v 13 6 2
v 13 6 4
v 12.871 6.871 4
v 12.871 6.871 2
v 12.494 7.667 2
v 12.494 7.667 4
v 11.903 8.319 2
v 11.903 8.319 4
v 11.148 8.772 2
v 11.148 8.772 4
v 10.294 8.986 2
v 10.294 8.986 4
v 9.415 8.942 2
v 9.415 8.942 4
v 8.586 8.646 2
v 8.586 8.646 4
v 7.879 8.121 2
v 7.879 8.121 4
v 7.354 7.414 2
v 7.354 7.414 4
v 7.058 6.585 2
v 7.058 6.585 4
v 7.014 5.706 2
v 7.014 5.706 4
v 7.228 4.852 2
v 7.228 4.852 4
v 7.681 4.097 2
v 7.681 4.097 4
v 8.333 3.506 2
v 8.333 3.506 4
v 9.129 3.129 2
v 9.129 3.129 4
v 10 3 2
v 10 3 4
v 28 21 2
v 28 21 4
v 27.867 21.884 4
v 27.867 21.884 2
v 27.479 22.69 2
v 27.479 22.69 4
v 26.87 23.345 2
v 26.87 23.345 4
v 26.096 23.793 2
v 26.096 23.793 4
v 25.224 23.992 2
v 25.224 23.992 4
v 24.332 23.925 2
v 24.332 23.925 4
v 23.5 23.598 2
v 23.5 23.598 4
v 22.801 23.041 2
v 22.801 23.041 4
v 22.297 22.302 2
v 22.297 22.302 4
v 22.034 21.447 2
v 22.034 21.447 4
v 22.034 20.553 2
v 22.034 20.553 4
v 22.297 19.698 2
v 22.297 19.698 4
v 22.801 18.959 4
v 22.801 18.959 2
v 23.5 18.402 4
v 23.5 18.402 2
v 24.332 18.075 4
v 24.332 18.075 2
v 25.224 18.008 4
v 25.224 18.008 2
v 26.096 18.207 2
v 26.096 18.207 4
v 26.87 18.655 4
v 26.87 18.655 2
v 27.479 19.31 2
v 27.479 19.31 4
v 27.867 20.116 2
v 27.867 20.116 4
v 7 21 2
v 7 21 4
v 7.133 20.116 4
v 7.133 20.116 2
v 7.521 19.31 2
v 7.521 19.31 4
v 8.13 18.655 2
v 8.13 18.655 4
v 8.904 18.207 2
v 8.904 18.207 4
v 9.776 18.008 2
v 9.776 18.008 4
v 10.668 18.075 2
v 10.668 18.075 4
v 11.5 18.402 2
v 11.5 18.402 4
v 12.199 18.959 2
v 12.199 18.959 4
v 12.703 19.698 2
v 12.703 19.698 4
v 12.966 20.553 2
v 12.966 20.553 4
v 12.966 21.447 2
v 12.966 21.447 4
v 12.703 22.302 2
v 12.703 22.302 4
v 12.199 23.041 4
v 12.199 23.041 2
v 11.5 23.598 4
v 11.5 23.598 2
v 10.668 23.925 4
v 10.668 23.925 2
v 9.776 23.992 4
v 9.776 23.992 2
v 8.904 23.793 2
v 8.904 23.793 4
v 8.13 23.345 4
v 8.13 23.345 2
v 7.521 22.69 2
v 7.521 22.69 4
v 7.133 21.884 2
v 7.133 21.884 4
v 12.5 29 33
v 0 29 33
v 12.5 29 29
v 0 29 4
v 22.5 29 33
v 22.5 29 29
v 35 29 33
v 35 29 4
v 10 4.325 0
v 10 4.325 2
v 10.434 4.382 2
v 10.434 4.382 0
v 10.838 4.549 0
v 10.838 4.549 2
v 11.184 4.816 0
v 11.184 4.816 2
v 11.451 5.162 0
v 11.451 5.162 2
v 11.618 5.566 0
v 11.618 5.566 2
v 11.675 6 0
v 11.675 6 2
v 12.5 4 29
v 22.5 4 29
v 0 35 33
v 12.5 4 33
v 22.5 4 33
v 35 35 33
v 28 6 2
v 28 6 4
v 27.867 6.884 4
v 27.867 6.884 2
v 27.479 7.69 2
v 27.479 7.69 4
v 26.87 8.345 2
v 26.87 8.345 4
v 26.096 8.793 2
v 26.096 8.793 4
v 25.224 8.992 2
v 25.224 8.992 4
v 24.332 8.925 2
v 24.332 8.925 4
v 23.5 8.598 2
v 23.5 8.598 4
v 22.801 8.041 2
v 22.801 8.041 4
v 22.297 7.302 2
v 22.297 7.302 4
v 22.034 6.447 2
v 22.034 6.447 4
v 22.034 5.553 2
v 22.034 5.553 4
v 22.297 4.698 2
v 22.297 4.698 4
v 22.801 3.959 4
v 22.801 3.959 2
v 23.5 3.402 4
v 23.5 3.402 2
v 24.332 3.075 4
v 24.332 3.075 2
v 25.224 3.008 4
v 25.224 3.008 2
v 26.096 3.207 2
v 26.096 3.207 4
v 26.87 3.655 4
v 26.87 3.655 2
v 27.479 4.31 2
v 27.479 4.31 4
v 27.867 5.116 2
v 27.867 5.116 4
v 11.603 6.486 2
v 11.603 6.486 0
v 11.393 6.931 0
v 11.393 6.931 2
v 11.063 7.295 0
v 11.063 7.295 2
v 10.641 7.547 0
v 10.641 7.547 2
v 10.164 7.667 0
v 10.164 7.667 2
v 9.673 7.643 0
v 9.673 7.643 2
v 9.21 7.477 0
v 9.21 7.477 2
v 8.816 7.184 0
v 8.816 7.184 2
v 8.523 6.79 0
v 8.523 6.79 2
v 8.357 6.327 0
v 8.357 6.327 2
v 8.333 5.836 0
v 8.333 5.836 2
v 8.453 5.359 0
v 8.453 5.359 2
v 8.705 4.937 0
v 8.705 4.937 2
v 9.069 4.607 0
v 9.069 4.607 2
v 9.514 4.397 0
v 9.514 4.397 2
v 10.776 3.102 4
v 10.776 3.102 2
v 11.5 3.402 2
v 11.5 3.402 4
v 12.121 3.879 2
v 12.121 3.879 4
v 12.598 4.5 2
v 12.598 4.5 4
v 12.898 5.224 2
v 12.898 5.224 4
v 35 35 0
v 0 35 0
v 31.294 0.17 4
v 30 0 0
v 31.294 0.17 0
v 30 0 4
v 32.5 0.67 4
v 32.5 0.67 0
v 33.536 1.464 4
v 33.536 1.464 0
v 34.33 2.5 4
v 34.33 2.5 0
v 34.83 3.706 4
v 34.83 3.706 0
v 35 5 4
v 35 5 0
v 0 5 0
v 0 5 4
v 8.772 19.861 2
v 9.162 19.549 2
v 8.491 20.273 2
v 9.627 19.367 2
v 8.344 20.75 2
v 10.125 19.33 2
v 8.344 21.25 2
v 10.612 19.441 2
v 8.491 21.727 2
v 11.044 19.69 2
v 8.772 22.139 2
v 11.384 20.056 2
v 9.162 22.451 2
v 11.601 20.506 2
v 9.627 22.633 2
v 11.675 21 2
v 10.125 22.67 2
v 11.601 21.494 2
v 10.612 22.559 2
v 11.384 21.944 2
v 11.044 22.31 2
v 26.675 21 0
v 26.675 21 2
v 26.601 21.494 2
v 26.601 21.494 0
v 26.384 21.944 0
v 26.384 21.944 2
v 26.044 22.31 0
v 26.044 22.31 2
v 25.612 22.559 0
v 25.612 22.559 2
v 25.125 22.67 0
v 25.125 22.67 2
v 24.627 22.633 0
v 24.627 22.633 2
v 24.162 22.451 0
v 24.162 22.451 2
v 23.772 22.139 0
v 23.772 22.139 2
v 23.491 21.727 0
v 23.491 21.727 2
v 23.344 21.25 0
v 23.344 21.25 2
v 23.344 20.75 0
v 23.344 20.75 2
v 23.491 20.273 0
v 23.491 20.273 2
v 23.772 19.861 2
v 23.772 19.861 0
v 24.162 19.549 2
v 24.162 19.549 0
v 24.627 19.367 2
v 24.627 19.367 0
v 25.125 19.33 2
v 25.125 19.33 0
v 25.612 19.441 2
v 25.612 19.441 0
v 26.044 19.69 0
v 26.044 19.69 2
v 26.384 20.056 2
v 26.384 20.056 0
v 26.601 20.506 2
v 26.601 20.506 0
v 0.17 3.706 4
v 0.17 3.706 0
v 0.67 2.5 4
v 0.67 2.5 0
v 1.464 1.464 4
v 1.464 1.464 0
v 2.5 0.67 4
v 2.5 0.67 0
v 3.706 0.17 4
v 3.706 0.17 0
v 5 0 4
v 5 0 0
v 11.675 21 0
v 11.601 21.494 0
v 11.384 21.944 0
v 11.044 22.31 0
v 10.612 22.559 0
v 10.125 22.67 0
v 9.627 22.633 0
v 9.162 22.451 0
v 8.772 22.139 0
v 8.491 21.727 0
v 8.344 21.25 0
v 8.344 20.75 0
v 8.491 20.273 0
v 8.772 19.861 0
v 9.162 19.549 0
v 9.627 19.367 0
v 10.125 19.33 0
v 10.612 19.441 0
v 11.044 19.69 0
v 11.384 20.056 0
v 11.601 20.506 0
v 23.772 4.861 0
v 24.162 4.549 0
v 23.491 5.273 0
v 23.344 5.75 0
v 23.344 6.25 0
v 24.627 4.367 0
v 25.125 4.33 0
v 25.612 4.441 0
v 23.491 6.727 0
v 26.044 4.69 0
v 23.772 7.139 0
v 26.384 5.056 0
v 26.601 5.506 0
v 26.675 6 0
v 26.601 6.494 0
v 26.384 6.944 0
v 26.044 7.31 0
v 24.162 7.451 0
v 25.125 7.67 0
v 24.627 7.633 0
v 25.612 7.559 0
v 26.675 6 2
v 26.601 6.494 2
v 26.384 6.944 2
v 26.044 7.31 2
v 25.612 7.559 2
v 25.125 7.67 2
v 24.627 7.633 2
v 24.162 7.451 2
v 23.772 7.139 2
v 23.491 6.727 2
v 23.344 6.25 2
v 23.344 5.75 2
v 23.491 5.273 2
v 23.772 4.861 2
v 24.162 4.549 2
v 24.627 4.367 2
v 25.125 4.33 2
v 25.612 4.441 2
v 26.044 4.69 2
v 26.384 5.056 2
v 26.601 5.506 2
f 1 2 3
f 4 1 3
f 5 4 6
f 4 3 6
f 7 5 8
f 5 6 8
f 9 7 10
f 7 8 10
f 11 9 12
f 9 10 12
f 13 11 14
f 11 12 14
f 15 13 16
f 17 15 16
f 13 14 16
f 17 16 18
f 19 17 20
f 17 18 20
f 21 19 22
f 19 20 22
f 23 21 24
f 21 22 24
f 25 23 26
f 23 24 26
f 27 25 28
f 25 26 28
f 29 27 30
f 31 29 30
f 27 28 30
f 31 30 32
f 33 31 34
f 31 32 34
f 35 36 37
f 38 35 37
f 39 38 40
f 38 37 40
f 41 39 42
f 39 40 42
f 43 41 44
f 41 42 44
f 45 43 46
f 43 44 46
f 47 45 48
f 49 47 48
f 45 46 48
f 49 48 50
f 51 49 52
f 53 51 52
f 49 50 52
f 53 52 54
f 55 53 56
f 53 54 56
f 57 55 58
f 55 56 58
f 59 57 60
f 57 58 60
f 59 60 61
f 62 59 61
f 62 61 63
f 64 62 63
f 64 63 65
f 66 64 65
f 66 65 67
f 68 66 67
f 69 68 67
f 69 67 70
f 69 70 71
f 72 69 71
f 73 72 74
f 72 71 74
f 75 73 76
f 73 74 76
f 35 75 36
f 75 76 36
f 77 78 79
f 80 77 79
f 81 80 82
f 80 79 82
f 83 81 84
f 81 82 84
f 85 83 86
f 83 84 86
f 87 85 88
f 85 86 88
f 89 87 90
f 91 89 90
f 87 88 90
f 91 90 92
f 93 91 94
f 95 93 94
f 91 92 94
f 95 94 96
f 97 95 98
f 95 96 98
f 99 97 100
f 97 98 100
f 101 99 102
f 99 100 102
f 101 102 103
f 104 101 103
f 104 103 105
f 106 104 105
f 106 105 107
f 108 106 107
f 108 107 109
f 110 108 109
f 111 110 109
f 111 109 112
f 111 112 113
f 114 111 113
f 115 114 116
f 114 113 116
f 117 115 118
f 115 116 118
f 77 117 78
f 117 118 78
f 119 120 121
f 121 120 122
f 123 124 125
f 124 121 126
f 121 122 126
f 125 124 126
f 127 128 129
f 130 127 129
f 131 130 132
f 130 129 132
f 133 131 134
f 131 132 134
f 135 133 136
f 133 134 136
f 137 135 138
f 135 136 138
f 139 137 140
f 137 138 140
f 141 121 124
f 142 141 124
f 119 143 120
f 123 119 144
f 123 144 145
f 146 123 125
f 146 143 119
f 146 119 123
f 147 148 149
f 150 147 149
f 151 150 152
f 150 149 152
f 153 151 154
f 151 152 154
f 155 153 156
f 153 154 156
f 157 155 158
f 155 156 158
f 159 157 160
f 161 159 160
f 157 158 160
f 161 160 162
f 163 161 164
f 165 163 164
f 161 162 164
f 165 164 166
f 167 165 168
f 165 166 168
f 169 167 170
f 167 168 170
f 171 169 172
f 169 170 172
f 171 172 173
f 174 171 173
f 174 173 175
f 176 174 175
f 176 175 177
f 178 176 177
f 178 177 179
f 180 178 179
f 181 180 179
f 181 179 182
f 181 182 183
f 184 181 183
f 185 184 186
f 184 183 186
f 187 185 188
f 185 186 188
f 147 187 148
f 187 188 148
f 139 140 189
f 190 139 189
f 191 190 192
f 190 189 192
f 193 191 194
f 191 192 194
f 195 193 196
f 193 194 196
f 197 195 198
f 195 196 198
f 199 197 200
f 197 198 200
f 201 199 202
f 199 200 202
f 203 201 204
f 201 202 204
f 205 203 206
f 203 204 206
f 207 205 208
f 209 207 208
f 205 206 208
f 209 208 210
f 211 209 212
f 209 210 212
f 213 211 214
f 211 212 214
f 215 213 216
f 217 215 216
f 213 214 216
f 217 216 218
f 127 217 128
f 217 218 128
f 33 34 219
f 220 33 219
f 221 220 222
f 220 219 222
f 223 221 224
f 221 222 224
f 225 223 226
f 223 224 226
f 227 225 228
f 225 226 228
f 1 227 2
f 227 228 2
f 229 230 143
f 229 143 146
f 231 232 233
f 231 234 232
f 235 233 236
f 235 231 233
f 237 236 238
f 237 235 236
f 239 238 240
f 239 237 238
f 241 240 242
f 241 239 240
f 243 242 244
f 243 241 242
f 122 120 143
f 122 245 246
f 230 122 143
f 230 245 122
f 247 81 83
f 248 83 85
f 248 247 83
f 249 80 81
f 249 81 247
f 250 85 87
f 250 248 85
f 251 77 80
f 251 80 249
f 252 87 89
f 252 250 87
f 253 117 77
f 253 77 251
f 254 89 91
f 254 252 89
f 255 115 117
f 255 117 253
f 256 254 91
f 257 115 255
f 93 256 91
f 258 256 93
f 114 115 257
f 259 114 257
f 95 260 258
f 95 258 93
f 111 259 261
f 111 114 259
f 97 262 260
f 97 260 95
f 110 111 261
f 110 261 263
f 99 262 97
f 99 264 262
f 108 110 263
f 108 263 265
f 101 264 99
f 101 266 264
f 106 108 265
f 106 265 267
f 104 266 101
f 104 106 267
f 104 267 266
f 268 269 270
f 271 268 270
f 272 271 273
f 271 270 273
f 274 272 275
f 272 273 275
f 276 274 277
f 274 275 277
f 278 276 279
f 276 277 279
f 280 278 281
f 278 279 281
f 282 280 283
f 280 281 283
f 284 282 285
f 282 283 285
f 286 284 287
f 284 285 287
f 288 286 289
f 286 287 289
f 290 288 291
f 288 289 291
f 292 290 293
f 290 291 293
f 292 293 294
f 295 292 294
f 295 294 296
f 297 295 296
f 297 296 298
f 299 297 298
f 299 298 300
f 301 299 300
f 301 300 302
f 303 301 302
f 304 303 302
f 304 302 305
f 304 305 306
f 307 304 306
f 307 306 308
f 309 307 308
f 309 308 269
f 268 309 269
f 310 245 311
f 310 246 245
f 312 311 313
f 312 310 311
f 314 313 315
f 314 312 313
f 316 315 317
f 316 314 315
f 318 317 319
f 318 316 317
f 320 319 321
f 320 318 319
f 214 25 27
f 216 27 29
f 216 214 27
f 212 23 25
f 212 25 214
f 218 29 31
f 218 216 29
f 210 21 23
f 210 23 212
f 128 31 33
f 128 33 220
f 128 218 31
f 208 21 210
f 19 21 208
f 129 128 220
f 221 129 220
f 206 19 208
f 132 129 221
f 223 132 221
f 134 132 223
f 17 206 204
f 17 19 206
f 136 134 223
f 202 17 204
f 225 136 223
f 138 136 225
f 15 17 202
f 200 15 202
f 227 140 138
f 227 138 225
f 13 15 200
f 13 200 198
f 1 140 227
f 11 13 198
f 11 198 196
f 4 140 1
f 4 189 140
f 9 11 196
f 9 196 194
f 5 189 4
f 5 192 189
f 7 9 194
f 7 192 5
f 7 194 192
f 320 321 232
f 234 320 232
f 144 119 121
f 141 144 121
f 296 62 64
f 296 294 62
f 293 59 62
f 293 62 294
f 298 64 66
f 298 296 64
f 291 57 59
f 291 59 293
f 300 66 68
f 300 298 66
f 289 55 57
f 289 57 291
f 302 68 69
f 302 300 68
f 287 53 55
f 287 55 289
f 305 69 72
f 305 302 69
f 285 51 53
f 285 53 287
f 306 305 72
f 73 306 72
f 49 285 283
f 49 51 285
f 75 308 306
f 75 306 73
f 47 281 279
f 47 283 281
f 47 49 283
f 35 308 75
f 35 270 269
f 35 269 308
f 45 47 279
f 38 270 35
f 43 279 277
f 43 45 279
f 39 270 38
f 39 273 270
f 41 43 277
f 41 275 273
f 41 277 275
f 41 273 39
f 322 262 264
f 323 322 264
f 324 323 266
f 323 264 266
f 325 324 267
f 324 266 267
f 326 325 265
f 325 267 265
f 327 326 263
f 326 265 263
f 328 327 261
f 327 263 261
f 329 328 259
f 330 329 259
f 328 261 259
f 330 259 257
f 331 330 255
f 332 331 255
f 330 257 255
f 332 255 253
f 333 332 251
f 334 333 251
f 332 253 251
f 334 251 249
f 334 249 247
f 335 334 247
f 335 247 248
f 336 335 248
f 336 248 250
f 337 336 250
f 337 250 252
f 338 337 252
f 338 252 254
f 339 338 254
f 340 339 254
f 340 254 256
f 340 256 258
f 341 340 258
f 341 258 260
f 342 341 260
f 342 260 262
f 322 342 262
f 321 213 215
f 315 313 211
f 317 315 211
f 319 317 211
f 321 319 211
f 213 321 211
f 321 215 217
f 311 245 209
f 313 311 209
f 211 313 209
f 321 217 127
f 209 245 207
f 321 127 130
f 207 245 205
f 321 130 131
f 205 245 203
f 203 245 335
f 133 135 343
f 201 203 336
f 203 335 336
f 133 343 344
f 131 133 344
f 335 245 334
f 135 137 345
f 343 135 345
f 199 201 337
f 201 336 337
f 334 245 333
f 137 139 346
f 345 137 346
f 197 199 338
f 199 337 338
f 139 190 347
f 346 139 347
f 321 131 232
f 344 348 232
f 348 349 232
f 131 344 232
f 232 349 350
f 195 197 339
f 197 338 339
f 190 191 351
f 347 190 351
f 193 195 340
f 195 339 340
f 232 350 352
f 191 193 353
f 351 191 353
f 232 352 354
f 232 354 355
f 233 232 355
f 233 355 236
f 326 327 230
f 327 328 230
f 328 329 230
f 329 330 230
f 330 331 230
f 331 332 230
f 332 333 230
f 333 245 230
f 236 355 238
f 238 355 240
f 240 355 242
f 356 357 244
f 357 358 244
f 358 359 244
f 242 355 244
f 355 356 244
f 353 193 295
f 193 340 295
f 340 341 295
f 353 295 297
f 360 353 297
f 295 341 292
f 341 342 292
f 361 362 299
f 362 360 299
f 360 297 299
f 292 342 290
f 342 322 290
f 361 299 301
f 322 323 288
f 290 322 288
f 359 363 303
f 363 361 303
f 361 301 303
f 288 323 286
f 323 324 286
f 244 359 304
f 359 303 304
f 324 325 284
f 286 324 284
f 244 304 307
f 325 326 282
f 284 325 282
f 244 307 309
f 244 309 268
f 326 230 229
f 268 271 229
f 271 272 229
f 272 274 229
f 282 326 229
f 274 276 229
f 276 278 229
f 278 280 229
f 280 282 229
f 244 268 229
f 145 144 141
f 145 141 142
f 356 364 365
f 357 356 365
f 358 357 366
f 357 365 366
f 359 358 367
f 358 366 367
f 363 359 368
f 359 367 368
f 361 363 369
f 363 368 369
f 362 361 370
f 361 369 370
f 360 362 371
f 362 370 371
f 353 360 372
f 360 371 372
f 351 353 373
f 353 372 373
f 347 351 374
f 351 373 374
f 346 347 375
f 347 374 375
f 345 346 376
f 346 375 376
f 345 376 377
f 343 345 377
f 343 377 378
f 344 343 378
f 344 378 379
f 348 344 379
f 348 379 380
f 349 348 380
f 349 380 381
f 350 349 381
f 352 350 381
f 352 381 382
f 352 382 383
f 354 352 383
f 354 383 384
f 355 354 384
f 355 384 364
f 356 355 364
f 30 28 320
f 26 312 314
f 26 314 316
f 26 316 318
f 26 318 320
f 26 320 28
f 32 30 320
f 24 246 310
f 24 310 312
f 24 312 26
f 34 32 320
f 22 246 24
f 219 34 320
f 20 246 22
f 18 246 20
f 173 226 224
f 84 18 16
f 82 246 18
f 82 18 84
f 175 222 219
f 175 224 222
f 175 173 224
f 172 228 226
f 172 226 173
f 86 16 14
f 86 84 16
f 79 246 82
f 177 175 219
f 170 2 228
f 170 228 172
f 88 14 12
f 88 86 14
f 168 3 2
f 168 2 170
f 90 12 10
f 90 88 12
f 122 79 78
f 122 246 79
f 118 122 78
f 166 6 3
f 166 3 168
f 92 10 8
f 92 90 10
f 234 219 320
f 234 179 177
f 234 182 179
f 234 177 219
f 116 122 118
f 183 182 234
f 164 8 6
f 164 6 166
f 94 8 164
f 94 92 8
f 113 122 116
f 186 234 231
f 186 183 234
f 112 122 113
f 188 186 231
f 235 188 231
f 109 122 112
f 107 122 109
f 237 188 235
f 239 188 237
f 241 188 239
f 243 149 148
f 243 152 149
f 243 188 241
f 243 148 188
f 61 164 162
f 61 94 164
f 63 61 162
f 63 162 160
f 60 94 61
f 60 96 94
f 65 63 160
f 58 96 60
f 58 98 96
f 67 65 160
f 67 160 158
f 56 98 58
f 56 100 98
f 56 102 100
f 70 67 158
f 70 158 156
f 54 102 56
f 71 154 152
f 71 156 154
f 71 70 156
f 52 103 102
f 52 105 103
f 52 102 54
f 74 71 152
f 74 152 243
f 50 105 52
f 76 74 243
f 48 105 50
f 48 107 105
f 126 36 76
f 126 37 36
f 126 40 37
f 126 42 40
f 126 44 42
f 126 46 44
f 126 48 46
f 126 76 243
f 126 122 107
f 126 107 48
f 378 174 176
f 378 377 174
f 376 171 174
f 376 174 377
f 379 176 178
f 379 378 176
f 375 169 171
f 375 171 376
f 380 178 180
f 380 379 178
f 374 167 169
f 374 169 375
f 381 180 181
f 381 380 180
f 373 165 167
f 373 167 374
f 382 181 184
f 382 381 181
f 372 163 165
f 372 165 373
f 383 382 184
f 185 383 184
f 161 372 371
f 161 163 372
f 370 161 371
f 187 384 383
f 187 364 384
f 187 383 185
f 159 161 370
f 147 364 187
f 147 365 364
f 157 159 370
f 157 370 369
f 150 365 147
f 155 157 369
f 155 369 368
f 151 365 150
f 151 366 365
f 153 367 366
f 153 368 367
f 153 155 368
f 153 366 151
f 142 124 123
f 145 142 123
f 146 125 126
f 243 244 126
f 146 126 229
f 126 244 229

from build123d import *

# Parameters (mm, degrees)
F0_W     = 35
F0_H     = 35
F1_DEPTH = 4
F2_R     = 3
F2_R_2   = 1.675
F4_DEPTH = 2
F5_R     = 5
F6_DEPTH = 25
F3_W     = 35
F3_H     = 6
F7_DEPTH = 29
F9_DEPTH = 25


with BuildPart() as f1:
    # F0 (on Top) → F1 (new body)
    with BuildSketch(Plane.XY):
        with Locations((17.5, 17.5)):
            Rectangle(F0_W, F0_H)
    extrude(amount=F1_DEPTH)

    # F2 (on face) → F4 (cut)
    with BuildSketch(Plane.XY.offset(4)):
        with BuildLine():
            ThreePointArc((13, 21), (10, 24), (7, 21))
            ThreePointArc((7, 21), (10, 18), (13, 21))
        make_face()
        with BuildLine():
            ThreePointArc((8.325, 21), (10, 22.675), (11.675, 21))
            ThreePointArc((11.675, 21), (10, 19.325), (8.325, 21))
        make_face(mode=Mode.SUBTRACT)
        with Locations((25, 21)):
            Circle(F2_R)
        with Locations((25, 21)):
            Circle(F2_R_2, mode=Mode.SUBTRACT)
        with Locations((25, 6)):
            Circle(F2_R)
        with Locations((25, 6)):
            Circle(F2_R_2, mode=Mode.SUBTRACT)
        with BuildLine():
            ThreePointArc((13, 6), (7.87868, 8.12132), (10, 3))
            ThreePointArc((10, 3), (12.12132, 3.87868), (13, 6))
        make_face()
        with BuildLine():
            ThreePointArc((11.675, 6), (11.184404, 4.815596), (10, 4.325))
            ThreePointArc((10, 4.325), (8.815596, 7.184404), (11.675, 6))
        make_face(mode=Mode.SUBTRACT)
    extrude(amount=-F4_DEPTH, mode=Mode.SUBTRACT)

    # F5
    f5_edges = [f1.edges().sort_by_distance(p)[0] for p in [
        (0, 0, 2),
        (35, 0, 2),
    ]]
    fillet(f5_edges, radius=F5_R)

    # F2 (on face) → F6 (cut)
    with BuildSketch(Plane.XY.offset(4)):
        with BuildLine():
            ThreePointArc((8.325, 21), (10, 19.325), (11.675, 21))
            ThreePointArc((11.675, 21), (10, 22.675), (8.325, 21))
        make_face()
        with Locations((25, 21)):
            Circle(F2_R_2)
        with Locations((25, 6)):
            Circle(F2_R_2)
        with BuildLine():
            ThreePointArc((11.675, 6), (8.815596, 7.184404), (10, 4.325))
            ThreePointArc((10, 4.325), (11.184404, 4.815596), (11.675, 6))
        make_face()
    extrude(amount=-F6_DEPTH, mode=Mode.SUBTRACT)

    # F3 (on face) → F7 (join)
    with BuildSketch(Plane.XY.offset(4)):
        with Locations((17.5, 32)):
            Rectangle(F3_W, F3_H)
    extrude(amount=F7_DEPTH)

    # F8 (on face) → F9 (join)
    with BuildSketch(Plane.XZ.offset(-29)):
        Polygon((22.5, 33), (17.5, 33), (12.5, 33), (12.5, 29), (22.5, 29), align=None)
    extrude(amount=F9_DEPTH)


solid = f1.part
